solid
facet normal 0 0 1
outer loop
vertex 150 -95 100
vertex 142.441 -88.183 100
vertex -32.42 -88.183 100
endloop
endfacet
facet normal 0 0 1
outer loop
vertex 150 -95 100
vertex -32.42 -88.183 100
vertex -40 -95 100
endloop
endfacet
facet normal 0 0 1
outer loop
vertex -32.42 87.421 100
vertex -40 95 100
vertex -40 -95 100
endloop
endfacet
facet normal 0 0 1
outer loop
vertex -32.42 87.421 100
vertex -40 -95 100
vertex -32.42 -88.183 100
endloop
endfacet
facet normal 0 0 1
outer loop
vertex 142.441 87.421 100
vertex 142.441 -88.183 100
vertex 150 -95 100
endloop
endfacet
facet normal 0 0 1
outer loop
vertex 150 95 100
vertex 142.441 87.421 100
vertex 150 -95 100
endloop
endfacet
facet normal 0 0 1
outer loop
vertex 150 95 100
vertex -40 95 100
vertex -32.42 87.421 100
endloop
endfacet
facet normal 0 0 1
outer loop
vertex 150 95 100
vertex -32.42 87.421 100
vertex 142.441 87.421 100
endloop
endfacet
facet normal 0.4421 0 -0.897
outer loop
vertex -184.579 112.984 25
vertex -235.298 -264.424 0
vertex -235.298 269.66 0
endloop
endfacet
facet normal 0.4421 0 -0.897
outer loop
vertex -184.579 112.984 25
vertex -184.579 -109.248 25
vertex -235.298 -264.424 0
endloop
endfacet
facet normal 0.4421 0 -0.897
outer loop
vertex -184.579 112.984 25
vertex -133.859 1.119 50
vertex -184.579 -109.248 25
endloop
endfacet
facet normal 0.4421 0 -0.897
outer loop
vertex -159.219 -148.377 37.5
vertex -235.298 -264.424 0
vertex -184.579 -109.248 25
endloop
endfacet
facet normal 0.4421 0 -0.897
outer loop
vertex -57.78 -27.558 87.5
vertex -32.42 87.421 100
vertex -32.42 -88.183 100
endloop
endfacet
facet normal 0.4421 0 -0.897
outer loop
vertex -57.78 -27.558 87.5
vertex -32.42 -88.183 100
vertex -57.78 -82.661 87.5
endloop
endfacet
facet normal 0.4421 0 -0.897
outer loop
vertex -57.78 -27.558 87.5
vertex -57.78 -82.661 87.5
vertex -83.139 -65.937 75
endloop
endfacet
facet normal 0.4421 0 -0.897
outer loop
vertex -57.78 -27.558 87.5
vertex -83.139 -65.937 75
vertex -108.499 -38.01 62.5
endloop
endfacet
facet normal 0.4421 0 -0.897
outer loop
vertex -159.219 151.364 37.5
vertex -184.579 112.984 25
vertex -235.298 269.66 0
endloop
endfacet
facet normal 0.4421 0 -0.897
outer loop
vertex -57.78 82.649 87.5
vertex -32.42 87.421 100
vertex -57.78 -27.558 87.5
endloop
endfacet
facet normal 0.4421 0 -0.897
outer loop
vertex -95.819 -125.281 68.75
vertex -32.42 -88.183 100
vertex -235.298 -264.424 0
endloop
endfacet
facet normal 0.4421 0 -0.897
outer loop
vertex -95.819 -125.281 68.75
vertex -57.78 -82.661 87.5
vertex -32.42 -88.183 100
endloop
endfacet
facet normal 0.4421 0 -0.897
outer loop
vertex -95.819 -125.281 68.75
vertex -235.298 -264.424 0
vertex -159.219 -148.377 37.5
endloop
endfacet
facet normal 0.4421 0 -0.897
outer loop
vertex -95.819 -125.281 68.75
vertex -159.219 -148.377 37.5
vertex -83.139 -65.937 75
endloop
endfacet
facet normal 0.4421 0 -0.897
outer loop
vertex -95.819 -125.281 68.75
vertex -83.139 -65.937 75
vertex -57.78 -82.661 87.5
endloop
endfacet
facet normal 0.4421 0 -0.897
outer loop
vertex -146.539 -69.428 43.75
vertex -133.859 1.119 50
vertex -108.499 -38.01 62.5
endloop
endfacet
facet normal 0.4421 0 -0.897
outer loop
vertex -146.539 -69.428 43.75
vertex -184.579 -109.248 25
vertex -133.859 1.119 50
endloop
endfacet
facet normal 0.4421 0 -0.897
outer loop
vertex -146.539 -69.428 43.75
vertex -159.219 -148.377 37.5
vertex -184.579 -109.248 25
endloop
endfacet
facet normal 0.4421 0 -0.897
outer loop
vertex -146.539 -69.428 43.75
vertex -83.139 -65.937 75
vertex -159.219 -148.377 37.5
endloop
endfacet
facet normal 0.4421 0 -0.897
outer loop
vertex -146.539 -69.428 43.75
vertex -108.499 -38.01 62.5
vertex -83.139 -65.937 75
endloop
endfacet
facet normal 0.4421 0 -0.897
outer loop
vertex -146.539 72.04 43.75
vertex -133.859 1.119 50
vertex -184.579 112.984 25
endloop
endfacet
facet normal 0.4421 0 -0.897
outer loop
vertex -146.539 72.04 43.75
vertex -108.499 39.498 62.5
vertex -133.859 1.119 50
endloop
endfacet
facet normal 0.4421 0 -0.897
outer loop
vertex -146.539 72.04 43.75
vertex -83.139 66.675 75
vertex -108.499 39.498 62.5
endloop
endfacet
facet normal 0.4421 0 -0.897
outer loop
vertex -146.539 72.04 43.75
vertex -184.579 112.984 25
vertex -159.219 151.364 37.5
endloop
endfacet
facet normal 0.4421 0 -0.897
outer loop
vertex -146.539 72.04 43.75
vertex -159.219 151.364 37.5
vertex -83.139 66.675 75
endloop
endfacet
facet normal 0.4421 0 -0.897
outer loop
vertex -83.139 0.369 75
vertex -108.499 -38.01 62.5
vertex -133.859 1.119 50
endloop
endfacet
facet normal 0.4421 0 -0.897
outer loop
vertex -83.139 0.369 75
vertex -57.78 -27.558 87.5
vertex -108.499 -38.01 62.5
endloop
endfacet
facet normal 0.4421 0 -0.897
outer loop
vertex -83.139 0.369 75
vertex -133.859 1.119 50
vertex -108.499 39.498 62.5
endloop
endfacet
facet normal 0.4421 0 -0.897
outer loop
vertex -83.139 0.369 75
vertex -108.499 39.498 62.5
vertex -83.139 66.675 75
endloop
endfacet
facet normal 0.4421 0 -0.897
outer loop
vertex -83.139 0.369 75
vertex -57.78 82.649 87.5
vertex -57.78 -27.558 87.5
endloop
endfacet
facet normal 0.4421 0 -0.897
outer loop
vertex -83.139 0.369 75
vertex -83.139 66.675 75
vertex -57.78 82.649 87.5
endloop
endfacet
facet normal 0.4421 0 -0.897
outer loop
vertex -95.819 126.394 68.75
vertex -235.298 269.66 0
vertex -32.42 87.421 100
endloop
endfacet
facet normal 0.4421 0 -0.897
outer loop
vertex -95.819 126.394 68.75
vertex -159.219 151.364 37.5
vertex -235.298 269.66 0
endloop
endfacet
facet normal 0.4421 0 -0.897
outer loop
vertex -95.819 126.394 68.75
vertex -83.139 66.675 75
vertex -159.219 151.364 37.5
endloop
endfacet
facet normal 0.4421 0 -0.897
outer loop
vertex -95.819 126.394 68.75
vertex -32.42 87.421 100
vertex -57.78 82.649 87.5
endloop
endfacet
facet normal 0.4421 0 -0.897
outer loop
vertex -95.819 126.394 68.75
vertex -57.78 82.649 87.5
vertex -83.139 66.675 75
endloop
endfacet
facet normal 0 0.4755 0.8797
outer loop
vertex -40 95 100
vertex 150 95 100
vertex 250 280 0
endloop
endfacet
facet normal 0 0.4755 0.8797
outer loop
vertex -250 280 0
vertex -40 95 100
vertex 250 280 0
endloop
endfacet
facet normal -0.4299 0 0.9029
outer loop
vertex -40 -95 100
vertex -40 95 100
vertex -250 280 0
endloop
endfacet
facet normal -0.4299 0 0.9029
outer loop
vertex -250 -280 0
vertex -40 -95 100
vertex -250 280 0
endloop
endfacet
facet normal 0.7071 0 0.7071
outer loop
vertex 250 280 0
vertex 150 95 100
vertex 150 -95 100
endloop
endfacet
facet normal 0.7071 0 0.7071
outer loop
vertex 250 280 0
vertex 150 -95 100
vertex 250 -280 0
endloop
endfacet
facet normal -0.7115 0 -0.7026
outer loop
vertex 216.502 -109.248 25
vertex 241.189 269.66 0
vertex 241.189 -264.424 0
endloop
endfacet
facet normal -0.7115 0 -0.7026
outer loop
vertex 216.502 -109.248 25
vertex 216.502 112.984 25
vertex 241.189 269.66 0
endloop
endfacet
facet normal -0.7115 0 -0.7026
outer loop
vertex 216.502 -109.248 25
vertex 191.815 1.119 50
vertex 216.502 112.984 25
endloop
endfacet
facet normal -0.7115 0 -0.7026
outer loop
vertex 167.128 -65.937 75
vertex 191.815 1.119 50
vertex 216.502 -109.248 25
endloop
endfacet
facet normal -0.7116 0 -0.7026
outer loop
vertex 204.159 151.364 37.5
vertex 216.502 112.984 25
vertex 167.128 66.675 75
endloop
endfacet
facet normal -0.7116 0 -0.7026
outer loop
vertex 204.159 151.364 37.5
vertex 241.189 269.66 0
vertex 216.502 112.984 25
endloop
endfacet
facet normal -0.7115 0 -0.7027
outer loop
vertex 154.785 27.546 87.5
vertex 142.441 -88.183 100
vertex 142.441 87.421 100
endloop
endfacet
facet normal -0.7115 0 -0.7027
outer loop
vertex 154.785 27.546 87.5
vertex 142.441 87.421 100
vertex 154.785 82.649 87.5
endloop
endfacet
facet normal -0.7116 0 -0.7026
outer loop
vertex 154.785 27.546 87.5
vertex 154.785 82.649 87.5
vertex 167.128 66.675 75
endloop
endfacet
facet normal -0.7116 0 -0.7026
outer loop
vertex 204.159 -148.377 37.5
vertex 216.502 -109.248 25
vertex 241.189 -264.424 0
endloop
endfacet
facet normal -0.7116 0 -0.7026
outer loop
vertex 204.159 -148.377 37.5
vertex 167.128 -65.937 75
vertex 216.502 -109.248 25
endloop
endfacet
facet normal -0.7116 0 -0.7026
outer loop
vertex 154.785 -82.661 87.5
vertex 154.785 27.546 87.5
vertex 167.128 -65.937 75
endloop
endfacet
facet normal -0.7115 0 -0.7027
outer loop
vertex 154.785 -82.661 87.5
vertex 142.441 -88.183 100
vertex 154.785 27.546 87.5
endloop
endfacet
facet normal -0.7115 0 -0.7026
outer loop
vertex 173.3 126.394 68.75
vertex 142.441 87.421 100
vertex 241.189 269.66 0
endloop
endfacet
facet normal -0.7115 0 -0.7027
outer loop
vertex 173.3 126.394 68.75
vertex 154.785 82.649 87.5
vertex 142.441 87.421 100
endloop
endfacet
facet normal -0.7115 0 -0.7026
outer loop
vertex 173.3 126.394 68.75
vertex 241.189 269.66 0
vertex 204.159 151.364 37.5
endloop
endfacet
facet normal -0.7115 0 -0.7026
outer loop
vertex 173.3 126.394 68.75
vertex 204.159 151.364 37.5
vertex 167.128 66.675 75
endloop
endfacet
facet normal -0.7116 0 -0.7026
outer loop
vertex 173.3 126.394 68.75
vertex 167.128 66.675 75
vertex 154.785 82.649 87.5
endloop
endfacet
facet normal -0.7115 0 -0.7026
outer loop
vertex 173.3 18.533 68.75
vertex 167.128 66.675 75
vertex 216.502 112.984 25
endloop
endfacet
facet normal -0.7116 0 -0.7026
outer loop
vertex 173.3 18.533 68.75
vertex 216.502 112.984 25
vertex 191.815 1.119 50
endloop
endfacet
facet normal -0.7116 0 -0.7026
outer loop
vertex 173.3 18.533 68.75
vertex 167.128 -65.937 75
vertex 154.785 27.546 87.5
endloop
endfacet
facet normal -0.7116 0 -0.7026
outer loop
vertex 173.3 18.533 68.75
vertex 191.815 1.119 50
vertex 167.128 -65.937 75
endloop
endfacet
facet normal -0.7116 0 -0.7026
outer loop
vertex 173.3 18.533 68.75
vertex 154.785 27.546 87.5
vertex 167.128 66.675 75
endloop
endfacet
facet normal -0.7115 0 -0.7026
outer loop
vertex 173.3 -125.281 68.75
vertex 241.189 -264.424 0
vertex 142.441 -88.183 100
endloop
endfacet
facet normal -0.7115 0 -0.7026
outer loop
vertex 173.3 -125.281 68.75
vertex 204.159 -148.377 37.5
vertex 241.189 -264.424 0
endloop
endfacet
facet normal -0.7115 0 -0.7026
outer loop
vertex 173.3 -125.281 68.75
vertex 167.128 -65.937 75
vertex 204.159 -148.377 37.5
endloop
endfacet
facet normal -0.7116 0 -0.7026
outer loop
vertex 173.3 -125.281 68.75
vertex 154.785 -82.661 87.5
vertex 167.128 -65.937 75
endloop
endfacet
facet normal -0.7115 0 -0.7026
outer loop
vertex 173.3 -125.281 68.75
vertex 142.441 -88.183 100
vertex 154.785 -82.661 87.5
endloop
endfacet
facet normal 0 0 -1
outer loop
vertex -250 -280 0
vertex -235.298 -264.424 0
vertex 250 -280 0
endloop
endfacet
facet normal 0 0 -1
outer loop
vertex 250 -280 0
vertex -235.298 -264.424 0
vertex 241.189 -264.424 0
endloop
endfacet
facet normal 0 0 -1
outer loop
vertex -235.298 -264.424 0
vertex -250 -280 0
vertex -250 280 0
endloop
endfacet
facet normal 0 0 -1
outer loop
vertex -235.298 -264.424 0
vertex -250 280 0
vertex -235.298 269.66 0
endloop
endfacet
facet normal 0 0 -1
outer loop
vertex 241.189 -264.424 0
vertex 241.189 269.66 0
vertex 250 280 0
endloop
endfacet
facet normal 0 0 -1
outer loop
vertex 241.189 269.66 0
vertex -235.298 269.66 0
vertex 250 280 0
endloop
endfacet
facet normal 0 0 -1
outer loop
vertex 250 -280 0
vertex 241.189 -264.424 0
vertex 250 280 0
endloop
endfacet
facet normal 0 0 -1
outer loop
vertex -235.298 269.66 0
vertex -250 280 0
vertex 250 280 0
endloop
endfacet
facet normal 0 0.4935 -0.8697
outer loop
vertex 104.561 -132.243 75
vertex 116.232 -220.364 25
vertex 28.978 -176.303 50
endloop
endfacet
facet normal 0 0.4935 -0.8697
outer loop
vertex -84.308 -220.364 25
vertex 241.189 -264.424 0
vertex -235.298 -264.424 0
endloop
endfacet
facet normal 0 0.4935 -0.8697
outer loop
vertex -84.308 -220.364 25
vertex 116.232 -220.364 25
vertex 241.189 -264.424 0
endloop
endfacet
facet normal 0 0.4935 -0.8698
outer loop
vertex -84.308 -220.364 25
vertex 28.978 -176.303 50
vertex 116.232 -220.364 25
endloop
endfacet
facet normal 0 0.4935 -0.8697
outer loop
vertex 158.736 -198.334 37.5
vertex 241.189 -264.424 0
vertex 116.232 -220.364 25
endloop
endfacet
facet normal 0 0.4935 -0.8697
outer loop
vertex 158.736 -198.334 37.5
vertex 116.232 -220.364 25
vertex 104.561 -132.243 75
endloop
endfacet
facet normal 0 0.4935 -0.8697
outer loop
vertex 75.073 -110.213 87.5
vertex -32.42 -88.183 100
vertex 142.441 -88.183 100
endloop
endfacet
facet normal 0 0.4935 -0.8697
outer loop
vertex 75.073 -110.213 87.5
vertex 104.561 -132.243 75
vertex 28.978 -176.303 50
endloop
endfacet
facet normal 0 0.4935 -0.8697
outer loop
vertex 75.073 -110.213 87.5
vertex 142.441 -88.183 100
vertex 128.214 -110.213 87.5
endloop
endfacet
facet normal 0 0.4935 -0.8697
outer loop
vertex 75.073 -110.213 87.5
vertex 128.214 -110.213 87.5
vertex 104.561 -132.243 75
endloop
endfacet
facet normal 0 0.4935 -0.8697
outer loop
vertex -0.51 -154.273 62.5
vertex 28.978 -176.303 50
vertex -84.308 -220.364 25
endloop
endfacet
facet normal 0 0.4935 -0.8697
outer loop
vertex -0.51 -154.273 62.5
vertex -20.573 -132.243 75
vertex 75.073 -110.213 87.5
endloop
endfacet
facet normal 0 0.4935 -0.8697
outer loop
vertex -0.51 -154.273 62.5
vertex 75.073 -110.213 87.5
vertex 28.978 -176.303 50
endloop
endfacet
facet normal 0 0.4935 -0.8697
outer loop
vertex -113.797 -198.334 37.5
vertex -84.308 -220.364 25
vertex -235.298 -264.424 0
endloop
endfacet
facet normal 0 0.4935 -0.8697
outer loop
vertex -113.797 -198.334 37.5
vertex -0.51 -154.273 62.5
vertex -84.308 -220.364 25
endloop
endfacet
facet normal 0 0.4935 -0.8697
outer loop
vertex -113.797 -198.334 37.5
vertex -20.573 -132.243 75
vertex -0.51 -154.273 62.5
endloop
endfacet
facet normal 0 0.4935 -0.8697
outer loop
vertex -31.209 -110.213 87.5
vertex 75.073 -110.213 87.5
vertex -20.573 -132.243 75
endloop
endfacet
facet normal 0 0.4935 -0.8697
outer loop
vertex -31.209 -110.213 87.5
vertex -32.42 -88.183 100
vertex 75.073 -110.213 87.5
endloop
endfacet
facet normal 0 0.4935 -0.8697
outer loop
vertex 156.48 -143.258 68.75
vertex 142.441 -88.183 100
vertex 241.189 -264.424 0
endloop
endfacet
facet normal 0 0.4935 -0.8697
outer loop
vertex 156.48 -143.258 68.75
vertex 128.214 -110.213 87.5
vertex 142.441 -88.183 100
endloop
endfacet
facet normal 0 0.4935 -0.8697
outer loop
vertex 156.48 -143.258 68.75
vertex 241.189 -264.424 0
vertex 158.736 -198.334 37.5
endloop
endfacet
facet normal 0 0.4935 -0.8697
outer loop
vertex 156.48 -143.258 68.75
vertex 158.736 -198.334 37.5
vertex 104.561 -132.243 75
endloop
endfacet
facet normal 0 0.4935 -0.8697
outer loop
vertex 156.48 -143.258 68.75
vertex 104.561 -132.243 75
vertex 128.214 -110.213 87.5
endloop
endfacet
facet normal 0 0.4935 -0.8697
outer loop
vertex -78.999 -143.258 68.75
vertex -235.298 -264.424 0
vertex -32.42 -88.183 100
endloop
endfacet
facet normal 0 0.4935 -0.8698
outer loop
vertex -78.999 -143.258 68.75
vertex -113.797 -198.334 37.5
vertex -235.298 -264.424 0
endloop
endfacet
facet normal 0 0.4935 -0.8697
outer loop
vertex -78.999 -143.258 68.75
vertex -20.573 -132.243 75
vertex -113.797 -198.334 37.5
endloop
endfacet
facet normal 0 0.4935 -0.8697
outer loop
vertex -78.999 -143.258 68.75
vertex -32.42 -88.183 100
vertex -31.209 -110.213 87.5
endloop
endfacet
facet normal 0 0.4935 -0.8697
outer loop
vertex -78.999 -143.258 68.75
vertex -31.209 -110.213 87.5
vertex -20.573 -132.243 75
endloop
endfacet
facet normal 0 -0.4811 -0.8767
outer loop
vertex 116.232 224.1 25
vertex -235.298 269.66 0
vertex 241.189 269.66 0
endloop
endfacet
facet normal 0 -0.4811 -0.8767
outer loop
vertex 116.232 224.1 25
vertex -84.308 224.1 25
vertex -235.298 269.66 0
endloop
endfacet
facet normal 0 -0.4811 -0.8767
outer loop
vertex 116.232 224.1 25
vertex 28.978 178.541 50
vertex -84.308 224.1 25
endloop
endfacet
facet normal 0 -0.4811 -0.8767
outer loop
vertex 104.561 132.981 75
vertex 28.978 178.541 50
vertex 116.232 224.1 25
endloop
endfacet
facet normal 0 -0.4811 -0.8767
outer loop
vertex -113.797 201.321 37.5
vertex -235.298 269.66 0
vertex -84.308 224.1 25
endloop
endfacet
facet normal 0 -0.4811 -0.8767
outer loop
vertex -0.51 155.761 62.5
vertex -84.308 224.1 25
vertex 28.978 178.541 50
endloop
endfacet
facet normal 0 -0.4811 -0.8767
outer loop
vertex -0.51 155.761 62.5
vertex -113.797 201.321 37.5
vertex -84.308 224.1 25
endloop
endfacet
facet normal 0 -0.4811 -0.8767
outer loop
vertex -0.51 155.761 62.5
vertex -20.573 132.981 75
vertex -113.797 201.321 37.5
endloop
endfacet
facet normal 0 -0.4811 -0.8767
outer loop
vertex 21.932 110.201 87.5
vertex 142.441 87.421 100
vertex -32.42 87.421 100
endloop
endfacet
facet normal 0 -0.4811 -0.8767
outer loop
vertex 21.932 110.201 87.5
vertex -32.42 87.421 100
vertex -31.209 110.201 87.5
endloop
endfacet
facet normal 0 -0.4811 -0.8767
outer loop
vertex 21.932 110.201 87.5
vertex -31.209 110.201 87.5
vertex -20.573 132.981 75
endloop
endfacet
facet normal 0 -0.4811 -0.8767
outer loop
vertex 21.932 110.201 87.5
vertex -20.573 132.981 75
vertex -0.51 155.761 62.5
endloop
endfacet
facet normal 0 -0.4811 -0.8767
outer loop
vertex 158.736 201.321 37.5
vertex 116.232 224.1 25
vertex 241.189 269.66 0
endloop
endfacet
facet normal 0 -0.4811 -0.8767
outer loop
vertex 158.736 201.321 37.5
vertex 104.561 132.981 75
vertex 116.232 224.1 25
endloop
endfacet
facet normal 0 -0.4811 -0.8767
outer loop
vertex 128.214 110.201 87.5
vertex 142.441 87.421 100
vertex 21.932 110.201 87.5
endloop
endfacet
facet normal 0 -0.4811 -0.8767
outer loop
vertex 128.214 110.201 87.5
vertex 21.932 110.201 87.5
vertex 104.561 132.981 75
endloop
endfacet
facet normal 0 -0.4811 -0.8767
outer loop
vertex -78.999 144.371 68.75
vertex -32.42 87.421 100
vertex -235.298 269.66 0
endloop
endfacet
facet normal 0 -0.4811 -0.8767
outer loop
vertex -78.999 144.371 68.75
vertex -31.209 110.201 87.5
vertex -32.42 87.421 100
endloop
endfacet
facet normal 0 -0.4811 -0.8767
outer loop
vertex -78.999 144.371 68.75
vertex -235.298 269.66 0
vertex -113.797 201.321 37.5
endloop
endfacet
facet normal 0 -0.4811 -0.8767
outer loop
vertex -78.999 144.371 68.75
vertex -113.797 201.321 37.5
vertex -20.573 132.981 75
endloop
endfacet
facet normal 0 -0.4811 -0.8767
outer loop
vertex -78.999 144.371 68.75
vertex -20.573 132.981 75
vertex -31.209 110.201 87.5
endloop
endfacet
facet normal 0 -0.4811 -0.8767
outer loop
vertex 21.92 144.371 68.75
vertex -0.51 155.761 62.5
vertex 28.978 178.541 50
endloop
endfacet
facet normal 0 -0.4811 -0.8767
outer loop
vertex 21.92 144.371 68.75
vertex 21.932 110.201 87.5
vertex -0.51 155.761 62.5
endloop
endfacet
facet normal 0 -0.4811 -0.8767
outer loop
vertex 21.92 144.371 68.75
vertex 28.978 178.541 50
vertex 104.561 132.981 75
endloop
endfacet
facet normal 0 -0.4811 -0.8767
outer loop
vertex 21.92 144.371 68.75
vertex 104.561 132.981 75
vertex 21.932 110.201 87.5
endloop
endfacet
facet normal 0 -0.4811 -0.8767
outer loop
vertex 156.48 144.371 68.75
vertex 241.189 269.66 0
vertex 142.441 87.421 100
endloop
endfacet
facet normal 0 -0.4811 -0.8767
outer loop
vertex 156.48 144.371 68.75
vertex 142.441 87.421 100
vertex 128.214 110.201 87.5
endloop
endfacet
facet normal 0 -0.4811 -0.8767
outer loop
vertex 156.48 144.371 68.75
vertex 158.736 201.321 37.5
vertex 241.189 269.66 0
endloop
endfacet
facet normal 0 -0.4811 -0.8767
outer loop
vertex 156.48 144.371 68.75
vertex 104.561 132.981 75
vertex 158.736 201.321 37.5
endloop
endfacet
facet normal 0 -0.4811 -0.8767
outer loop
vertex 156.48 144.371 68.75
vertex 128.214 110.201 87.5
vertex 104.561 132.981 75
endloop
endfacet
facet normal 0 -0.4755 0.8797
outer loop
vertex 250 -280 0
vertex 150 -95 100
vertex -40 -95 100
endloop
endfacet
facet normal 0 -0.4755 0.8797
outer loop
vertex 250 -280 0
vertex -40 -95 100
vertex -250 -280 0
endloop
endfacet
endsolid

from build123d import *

# Parameters (mm, degrees)
SKETCH1_W               = 500
SKETCH1_H               = 560
BOSS_EXTRUDE1_DEPTH     = 100
CUT_EXTRUDE2_DEPTH      = 560
CUT_EXTRUDE4_DEPTH      = 560
CUT_EXTRUDE5_DEPTH      = 281
CUT_EXTRUDE5_DEPTH_BACK = 281
SKETCH9_W               = 476.487053383
SKETCH9_H               = 534.084389506
SKETCH8_W               = 174.861253259
SKETCH8_H               = 175.603763888


with BuildPart() as part:
    # Sketch1 → Boss-Extrude1 (new body)
    with BuildSketch(Plane.XY):
        Rectangle(SKETCH1_W, SKETCH1_H)
    extrude(amount=BOSS_EXTRUDE1_DEPTH)

    # Sketch2 → Cut-Extrude2 (cut)
    with BuildSketch(Plane(origin=(0, 280, 0), x_dir=(1, 0, 0), z_dir=(0, 1, 0))):
        Polygon((250, -100), (150, -100), (250, 0), align=None)
    extrude(amount=-CUT_EXTRUDE2_DEPTH, mode=Mode.SUBTRACT)

    # Sketch6 → Cut-Extrude4 (cut)
    with BuildSketch(Plane.ZY.offset(250)):
        Polygon((100, 95), (0, 280), (100, 280), align=None)
        Polygon((100, -95), (0, -280), (100, -280), align=None)
    extrude(amount=-CUT_EXTRUDE4_DEPTH, mode=Mode.SUBTRACT)

    # Sketch7 → Cut-Extrude5 (cut, two sides)
    with BuildSketch(Plane(origin=(0, 0, 0), x_dir=(1, 0, 0), z_dir=(0, 1, 0))) as cut_extrude5_sk:
        Polygon((-250, 0), (-250, -100), (-40, -100), align=None)
    extrude(amount=CUT_EXTRUDE5_DEPTH, mode=Mode.SUBTRACT)
    extrude(cut_extrude5_sk.sketch, amount=-CUT_EXTRUDE5_DEPTH_BACK, mode=Mode.SUBTRACT)

    # Sketch9 → Cut-Loft1 section 0
    with BuildSketch(Plane(origin=(0, 0, 0), x_dir=(-1, 0, 0), z_dir=(0, 0, -1))):
        with Locations((-2.945318325, 2.618060733)):
            Rectangle(SKETCH9_W, SKETCH9_H)
    # Sketch8 → Cut-Loft1 section 1
    with BuildSketch(Plane.XY.offset(100)):
        with Locations((55.010720812, -0.38064907)):
            Rectangle(SKETCH8_W, SKETCH8_H)
    loft(mode=Mode.SUBTRACT)


solid = part.part
